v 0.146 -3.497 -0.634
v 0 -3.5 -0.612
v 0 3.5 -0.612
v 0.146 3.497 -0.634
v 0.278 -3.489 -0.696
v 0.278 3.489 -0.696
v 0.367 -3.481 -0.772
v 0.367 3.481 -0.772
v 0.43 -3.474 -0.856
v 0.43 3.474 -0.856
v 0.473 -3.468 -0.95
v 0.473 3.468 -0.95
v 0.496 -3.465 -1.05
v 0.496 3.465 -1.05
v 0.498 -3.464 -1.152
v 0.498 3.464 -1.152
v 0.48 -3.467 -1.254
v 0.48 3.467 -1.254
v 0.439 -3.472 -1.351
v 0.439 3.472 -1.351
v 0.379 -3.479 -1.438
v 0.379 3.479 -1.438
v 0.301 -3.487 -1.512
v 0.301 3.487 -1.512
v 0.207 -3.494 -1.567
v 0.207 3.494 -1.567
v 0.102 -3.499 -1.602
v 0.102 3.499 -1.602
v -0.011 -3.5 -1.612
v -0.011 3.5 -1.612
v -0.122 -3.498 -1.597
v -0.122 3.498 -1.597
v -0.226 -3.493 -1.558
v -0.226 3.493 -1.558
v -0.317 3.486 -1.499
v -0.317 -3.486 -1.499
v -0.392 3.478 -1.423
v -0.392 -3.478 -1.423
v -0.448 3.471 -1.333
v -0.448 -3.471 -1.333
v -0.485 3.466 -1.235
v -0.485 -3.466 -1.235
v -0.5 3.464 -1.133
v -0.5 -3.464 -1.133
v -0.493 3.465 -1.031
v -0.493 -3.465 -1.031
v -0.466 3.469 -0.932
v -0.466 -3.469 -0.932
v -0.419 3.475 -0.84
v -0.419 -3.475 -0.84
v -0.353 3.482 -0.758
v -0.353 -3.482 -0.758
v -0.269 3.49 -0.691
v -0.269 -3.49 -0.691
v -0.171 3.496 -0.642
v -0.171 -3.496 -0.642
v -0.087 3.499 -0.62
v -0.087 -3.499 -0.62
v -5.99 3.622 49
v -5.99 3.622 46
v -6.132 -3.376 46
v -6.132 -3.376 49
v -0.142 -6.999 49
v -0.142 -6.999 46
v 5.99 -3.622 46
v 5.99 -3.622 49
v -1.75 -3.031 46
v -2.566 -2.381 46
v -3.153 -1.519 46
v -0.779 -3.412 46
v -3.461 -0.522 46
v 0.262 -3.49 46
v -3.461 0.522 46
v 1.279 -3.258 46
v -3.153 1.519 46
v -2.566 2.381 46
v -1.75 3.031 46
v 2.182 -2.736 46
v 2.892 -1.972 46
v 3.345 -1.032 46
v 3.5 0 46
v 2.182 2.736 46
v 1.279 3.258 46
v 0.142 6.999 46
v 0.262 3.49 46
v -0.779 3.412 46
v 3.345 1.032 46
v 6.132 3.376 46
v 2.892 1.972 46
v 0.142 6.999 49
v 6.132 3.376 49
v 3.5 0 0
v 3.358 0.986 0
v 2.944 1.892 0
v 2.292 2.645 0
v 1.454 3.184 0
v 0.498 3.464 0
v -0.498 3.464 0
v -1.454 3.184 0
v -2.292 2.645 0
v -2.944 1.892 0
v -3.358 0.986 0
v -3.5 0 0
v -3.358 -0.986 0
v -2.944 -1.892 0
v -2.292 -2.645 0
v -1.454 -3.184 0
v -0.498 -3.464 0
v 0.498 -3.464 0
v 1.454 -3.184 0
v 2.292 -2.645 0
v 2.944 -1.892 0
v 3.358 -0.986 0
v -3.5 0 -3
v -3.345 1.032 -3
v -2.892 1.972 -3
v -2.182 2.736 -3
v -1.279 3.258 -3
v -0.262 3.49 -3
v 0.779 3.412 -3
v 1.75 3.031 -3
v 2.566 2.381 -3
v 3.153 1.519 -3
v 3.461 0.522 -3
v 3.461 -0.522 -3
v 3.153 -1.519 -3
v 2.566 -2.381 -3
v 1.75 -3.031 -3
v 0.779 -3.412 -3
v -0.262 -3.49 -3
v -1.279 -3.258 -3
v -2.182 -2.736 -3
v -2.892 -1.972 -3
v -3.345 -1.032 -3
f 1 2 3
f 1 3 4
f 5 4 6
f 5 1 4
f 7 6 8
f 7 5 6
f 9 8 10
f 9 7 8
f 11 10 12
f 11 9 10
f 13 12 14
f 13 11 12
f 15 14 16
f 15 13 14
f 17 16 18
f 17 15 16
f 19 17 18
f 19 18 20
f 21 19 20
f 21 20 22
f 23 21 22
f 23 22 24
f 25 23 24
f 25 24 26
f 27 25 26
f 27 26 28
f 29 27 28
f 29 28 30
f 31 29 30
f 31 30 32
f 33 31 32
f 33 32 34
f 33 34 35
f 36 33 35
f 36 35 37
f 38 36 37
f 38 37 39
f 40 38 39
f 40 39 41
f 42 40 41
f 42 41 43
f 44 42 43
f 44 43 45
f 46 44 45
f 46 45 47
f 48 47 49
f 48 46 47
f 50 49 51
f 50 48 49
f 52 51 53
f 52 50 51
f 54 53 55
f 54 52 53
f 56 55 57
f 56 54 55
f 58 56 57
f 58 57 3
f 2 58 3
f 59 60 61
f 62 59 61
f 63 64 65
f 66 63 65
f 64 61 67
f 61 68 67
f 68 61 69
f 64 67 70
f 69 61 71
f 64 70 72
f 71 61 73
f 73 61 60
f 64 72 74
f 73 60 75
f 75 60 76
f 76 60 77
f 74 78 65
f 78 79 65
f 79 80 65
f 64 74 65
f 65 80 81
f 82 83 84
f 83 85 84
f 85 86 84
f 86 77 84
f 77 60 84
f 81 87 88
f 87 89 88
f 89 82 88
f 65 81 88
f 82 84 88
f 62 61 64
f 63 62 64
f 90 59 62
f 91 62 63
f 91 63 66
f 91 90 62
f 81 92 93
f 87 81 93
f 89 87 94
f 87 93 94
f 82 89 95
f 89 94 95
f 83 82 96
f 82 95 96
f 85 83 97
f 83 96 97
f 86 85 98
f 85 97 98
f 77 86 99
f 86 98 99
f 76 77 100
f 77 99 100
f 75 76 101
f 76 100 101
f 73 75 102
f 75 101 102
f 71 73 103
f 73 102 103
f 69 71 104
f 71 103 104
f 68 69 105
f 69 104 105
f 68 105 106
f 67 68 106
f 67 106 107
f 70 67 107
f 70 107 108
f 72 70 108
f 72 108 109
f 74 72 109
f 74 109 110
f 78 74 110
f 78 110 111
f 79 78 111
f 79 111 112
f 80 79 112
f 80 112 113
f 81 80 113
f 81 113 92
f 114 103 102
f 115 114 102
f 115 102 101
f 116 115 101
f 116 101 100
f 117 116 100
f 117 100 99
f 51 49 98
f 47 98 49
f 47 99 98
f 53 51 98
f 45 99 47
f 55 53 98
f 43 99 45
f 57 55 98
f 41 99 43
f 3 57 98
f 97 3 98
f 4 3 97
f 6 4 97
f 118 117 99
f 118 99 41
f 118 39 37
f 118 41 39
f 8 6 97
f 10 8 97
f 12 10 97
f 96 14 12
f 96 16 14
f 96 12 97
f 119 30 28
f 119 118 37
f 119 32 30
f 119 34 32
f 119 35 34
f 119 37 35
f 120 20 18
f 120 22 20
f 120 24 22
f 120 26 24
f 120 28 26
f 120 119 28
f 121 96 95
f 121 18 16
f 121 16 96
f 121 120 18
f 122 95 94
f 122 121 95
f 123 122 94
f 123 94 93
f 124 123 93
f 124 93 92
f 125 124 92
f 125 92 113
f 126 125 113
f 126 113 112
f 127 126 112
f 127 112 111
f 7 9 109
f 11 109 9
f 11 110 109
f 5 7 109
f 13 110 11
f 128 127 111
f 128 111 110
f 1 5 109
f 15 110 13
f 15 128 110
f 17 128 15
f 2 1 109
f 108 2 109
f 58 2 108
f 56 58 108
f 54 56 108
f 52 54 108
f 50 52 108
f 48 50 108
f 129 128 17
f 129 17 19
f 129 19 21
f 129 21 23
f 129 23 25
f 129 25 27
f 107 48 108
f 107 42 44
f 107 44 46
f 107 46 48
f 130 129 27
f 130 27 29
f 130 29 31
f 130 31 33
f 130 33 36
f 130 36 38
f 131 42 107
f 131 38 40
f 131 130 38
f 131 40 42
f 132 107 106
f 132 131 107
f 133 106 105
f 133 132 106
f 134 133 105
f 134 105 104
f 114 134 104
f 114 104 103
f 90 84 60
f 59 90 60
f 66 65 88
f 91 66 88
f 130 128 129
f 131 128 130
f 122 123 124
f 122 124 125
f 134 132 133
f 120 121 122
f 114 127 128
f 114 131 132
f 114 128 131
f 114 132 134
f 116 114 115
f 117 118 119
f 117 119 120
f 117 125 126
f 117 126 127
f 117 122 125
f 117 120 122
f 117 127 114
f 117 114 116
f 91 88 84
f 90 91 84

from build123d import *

# Parameters (mm, degrees)
SKETCH1_R               = 3.5
BOSS_EXTRUDE1_DEPTH     = 46
BOSS_EXTRUDE2_DEPTH     = 3
BOSS_EXTRUDE3_START     = 3
SKETCH3_R               = 3.5
BOSS_EXTRUDE3_DEPTH     = 3
CUT_EXTRUDE2_DEPTH      = 13
CUT_EXTRUDE2_DEPTH_BACK = 15
SKETCH4_R               = 0.5


with BuildPart() as part:
    # Sketch1 → Boss-Extrude1 (new body)
    with BuildSketch(Plane.XY):
        Circle(SKETCH1_R)
    extrude(amount=BOSS_EXTRUDE1_DEPTH)

    # Sketch2 → Boss-Extrude2 (add)
    with BuildSketch(Plane.XY.offset(46)):
        Polygon((0.14203789, 6.998558797), (-5.989910763, 3.62228782), (-6.131948653, -3.376270977), (-0.14203789, -6.998558797), (5.989910763, -3.62228782), (6.131948653, 3.376270977), align=None)
    extrude(amount=BOSS_EXTRUDE2_DEPTH)

    # Sketch3 → Boss-Extrude3 (add)
    with BuildSketch(Plane(origin=(0, 0, 0), x_dir=(-1, 0, 0), z_dir=(0, 0, -1)).offset(BOSS_EXTRUDE3_START)):
        Circle(SKETCH3_R)
    extrude(amount=-BOSS_EXTRUDE3_DEPTH)

    # Sketch4 → Cut-Extrude2 (cut, two sides: drawn at the far end of the back side and taken through both)
    with BuildSketch(Plane(origin=(0, 0, 0), x_dir=(1, 0, 0), z_dir=(0, 1, 0)).offset(-CUT_EXTRUDE2_DEPTH_BACK)):
        with Locations(Location((0, 1.112079682, 0), (0, 0, 270))):
            Circle(SKETCH4_R)
    extrude(amount=CUT_EXTRUDE2_DEPTH + CUT_EXTRUDE2_DEPTH_BACK, mode=Mode.SUBTRACT)


solid = part.part
